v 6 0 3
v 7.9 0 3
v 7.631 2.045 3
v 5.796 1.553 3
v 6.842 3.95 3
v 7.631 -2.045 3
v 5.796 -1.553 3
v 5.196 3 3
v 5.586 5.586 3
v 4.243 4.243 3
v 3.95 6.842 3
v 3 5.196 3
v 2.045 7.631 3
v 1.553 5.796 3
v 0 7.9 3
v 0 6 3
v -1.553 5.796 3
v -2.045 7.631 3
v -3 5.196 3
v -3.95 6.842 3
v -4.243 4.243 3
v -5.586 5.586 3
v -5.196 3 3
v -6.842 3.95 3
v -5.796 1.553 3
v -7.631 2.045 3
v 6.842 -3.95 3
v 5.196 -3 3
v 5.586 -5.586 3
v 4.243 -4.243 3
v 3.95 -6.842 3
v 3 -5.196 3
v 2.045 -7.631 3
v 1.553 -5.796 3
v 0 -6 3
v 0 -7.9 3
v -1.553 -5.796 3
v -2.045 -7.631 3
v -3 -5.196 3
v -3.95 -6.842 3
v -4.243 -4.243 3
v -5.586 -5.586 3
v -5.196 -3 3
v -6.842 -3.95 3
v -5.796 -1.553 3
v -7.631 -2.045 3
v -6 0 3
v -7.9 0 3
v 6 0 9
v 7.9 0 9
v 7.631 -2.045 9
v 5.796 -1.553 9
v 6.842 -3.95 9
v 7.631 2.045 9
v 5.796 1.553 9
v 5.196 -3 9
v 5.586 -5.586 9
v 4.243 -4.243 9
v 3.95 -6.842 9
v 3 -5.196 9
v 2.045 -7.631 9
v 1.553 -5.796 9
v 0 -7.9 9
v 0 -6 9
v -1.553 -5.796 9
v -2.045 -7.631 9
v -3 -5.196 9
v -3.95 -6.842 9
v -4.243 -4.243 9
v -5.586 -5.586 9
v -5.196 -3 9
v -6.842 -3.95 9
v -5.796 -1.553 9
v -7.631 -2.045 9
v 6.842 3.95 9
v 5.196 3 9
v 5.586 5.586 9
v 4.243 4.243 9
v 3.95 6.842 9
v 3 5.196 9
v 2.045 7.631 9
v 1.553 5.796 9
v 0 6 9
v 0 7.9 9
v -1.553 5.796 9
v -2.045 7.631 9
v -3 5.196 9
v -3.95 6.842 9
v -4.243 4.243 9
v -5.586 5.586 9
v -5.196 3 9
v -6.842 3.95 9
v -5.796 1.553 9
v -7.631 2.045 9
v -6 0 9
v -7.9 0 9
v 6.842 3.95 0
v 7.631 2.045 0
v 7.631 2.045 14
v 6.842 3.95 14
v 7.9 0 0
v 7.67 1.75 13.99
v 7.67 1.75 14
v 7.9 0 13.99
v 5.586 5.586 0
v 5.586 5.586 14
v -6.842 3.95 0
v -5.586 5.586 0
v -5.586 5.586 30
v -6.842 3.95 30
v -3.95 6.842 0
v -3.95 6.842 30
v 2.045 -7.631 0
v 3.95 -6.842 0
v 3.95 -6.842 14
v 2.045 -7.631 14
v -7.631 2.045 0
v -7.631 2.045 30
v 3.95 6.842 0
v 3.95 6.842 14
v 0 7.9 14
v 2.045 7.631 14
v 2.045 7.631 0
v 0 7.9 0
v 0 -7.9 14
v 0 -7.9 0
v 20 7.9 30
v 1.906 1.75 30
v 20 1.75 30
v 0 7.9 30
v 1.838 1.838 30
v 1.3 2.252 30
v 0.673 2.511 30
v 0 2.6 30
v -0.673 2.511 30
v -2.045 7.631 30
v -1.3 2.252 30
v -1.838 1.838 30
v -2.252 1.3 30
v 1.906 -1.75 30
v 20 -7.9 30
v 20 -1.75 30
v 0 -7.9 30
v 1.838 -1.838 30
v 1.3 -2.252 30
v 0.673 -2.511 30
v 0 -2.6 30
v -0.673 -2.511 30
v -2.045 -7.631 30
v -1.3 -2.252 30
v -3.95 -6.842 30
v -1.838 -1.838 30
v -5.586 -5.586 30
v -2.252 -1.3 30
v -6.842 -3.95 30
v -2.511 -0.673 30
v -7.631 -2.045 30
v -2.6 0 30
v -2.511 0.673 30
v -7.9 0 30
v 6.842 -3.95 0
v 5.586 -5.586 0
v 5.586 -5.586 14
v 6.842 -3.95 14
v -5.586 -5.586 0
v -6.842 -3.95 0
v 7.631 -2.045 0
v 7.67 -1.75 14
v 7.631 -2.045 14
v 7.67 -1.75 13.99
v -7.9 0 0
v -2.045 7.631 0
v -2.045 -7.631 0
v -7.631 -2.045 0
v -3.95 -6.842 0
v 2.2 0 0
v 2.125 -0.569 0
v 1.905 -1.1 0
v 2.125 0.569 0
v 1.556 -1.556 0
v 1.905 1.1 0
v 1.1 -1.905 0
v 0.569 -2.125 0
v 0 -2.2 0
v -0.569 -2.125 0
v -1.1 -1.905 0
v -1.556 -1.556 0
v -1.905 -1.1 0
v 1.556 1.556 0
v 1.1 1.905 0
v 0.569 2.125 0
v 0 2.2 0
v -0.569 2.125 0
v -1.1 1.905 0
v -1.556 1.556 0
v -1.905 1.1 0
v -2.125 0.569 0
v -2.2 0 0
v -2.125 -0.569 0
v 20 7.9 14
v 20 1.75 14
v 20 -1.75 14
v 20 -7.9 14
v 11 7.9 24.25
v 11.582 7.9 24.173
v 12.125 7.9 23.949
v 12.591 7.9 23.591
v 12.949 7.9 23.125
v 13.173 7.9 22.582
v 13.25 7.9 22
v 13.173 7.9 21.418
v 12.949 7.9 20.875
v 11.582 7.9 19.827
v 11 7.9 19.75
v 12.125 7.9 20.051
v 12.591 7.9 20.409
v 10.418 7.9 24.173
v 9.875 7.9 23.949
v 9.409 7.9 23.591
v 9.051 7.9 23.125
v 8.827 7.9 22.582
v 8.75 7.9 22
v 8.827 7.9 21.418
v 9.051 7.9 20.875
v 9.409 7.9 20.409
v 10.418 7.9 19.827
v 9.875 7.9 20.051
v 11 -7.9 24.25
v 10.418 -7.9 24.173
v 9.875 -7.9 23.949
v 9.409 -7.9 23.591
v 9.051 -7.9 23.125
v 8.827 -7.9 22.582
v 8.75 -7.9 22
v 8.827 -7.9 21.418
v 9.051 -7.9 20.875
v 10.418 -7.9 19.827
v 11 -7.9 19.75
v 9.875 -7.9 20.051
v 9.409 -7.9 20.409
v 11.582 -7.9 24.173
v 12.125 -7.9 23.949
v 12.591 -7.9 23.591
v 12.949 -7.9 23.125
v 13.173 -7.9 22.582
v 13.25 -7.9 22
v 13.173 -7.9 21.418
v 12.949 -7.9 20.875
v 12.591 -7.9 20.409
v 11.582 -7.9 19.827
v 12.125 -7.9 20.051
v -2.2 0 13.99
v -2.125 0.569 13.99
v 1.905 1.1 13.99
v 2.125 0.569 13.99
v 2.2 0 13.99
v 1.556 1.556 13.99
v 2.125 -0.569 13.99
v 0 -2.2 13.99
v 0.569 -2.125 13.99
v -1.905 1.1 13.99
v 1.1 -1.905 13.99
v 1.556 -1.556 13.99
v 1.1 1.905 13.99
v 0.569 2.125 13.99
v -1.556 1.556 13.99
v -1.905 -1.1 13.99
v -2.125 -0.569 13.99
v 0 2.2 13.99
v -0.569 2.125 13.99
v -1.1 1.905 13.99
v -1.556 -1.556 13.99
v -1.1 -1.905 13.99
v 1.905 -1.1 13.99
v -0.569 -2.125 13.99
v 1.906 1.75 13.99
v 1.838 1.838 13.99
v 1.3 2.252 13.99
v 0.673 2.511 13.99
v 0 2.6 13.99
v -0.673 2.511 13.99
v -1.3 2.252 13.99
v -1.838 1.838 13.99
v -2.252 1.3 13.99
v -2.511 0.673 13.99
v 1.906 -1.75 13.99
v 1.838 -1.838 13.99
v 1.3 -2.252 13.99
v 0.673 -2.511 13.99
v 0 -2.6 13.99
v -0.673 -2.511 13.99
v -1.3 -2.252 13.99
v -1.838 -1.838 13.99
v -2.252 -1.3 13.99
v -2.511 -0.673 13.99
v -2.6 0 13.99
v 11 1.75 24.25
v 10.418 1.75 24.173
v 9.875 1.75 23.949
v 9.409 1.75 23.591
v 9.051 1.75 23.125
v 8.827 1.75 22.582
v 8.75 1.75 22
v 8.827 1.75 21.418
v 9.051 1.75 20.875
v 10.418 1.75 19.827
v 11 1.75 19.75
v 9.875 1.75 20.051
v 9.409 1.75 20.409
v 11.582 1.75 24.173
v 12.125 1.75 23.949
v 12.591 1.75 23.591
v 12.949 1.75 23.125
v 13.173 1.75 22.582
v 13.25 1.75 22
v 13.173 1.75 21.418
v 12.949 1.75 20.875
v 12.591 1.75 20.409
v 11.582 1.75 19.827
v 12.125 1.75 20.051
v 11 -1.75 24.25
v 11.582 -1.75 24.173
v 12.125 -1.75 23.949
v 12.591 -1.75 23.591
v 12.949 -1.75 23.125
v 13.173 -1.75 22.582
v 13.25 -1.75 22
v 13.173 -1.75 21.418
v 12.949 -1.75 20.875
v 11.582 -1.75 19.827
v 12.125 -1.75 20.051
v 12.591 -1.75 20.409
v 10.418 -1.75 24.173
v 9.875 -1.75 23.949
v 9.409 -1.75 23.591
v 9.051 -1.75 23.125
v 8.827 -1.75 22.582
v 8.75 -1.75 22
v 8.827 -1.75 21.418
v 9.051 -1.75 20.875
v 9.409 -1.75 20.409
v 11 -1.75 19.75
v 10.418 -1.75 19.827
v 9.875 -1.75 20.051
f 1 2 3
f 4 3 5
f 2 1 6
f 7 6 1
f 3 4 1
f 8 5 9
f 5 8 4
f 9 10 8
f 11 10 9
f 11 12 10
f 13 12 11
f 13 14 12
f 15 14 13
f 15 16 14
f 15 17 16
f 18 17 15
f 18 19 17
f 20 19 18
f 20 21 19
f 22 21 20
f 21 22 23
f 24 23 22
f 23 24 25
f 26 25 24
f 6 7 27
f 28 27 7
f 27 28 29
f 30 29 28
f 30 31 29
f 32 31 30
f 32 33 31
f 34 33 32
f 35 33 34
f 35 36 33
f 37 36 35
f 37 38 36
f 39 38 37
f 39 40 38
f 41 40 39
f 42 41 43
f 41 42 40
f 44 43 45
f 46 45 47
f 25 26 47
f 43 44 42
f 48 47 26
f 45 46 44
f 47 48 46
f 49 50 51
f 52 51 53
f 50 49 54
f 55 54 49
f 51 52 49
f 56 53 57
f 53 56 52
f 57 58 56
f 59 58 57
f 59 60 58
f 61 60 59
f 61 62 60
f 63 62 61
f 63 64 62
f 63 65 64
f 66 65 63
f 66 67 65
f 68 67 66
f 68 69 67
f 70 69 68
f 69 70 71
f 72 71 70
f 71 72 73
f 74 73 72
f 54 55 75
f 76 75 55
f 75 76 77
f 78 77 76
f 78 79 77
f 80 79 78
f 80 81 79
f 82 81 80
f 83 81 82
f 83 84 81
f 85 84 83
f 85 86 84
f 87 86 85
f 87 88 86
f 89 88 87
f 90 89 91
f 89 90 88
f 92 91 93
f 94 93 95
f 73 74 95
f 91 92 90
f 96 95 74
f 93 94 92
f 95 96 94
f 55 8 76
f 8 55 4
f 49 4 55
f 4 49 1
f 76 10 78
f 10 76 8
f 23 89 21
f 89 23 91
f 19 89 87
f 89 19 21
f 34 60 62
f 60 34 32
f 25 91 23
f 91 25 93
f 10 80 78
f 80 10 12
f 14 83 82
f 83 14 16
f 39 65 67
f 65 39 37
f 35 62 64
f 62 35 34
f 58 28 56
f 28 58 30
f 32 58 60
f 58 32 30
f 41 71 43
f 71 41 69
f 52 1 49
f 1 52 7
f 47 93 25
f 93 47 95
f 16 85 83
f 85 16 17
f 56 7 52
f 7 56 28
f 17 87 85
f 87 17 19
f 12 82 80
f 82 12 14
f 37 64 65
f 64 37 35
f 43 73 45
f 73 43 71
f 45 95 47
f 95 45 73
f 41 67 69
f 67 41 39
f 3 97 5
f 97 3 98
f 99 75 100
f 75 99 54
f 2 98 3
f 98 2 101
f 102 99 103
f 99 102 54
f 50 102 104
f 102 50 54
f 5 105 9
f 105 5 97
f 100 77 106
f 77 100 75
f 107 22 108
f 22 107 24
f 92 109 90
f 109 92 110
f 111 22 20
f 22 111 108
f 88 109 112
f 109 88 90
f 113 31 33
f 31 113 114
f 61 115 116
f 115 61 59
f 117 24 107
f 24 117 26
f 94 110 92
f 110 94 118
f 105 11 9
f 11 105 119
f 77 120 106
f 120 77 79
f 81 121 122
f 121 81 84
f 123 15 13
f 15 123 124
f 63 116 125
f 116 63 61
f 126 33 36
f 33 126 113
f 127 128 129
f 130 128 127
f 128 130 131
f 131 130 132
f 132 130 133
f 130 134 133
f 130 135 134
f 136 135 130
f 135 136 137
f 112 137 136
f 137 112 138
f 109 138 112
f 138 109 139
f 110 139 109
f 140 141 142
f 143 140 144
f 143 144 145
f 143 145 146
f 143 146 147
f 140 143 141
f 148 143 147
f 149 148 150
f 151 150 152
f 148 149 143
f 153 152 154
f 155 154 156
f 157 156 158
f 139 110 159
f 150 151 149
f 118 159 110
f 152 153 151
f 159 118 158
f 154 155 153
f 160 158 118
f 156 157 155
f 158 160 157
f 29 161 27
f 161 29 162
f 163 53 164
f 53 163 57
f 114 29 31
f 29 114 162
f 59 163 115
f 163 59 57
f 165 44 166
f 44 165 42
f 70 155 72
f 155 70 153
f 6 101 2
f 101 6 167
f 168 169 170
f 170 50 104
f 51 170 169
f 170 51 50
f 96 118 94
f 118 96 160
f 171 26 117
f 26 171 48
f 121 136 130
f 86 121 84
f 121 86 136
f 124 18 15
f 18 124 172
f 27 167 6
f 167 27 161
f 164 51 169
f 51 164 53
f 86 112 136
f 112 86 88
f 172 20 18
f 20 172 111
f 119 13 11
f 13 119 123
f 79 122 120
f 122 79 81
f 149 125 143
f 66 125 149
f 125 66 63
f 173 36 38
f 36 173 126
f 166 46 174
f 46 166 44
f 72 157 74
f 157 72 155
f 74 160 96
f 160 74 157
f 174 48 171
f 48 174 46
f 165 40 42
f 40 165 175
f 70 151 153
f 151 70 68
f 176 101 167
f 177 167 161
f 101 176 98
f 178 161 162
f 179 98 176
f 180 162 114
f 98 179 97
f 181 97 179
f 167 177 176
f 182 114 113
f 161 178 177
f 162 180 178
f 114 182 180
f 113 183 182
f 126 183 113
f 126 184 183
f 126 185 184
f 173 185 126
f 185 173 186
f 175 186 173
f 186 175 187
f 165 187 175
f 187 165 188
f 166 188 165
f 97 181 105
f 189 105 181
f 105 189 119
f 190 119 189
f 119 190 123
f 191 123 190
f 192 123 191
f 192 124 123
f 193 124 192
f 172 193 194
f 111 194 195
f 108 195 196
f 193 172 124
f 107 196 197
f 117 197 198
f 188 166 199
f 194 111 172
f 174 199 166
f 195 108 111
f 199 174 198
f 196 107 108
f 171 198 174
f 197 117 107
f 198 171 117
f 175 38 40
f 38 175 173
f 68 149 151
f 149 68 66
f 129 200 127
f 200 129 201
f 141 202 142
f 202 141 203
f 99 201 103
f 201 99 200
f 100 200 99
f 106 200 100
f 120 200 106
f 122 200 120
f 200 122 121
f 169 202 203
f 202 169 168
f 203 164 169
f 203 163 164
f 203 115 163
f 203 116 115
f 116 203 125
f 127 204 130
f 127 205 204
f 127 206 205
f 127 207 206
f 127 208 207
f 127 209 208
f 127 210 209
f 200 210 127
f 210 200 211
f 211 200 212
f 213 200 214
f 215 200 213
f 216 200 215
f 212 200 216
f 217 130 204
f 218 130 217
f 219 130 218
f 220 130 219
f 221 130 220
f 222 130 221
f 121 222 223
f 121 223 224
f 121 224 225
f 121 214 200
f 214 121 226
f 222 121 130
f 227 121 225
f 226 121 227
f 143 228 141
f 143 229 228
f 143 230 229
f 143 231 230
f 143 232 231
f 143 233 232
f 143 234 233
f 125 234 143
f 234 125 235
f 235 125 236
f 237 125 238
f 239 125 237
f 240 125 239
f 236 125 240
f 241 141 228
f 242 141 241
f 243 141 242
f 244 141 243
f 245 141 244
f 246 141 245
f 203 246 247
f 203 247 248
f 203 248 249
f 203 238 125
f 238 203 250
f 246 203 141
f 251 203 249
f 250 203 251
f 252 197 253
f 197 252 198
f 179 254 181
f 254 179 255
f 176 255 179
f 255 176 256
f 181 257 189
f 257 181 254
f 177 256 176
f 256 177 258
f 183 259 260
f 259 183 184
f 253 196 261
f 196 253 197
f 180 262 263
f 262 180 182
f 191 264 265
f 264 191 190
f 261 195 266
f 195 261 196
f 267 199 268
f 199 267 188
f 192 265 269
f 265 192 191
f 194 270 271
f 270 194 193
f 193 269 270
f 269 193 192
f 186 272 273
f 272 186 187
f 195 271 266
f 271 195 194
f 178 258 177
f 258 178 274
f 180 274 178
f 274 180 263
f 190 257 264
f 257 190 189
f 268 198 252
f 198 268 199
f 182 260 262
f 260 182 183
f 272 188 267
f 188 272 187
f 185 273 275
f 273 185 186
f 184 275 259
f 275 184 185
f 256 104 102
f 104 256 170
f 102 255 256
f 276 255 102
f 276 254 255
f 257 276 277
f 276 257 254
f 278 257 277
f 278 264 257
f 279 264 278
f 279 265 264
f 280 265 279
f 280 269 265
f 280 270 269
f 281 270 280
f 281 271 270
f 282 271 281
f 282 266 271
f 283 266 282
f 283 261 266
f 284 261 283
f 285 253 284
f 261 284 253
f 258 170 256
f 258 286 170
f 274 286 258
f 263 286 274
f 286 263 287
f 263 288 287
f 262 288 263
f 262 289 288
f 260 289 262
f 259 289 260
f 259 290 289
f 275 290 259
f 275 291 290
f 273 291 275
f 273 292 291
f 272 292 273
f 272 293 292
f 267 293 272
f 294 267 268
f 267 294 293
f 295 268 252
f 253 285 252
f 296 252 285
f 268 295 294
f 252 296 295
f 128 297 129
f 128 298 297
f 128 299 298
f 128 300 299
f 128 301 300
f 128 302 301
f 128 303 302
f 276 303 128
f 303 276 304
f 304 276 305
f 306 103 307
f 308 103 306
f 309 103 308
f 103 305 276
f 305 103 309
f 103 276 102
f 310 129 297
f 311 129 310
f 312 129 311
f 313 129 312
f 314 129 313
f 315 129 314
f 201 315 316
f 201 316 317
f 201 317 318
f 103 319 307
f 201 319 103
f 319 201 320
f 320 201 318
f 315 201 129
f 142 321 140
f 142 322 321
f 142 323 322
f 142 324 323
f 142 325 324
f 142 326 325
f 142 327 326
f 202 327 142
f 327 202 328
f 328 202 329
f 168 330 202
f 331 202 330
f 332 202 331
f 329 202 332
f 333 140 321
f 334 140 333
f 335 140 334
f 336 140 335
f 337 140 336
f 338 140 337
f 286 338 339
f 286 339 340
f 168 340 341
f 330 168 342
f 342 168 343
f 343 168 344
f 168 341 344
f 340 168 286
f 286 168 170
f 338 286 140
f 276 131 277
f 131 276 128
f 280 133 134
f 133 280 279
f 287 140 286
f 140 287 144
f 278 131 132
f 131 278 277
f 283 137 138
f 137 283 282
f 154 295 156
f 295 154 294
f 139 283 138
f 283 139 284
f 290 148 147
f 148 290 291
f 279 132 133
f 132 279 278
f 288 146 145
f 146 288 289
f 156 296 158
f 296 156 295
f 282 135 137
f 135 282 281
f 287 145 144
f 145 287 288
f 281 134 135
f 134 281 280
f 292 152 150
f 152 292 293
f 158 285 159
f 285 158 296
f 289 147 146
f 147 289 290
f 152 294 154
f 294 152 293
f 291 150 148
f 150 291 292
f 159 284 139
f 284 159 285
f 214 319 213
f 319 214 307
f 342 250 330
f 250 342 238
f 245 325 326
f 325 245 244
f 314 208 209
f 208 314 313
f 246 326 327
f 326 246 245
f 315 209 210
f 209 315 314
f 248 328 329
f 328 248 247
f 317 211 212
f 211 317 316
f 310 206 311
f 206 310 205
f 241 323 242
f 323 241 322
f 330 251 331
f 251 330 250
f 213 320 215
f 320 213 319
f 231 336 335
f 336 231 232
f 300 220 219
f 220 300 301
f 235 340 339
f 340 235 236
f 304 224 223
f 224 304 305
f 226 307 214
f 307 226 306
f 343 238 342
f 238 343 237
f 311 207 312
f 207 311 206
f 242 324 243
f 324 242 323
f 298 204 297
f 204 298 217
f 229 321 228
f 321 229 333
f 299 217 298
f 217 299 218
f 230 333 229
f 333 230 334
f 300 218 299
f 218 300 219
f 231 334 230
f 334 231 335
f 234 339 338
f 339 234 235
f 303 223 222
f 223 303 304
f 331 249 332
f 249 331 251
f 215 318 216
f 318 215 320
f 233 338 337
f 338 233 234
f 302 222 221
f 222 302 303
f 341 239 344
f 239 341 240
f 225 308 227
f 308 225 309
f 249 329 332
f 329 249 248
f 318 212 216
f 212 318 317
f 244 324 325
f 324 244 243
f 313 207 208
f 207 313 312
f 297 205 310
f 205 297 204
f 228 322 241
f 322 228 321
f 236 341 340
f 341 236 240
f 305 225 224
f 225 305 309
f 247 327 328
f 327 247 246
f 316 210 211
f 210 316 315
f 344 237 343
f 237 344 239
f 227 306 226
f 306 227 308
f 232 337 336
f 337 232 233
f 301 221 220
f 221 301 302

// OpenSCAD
module ptfe_tube_clip
(
	ext_diam=15.8,
	cut_diam=12,
	full_len=30,
	int_len=14,
	cut1_len=3,
	cut2_len=6,
	clip_len=20,
	clip_cut=3.5,
	ptfe_ext_diam=4.4,
	ptfe_clip_diam=5.2,
	screw_diam=4.5,
	screw_x=11,
	quality=1,
	attach=0.01,
)
{
	difference()
	{
		union()
		{
			difference()
			{
				cylinder(d=ext_diam,h=full_len,$fn=24*quality);
				translate([0,0,cut1_len])
					difference()
					{
						cylinder(d=ext_diam+attach,h=cut2_len,$fn=24*quality);
						translate([0,0,-attach])
							cylinder(d=cut_diam,h=cut2_len+2*attach,$fn=24*quality);
					}
			}
			//clip
			translate([0,-ext_diam/2,int_len])
				cube([clip_len,ext_diam,full_len-int_len]);
		}
		//ptfe
		translate([0,0,-attach])
			cylinder(d=ptfe_ext_diam,h=full_len+2*attach,$fn=24*quality);
		//clip cut
		translate([0,-clip_cut/2,int_len-attach])
				cube([clip_len+attach,clip_cut,full_len-int_len+2*attach]);
		//ptfe clip
		translate([0,0,int_len-attach])
			cylinder(d=ptfe_clip_diam,h=full_len-int_len+2*attach,$fn=24*quality);
		translate([screw_x,0,int_len+(full_len-int_len)/2])
			rotate(a=90,v=[1,0,0])
				cylinder(d=screw_diam,h=ext_diam+2*attach,center=true,$fn=24*quality);
	}
}

ptfe_tube_clip();
